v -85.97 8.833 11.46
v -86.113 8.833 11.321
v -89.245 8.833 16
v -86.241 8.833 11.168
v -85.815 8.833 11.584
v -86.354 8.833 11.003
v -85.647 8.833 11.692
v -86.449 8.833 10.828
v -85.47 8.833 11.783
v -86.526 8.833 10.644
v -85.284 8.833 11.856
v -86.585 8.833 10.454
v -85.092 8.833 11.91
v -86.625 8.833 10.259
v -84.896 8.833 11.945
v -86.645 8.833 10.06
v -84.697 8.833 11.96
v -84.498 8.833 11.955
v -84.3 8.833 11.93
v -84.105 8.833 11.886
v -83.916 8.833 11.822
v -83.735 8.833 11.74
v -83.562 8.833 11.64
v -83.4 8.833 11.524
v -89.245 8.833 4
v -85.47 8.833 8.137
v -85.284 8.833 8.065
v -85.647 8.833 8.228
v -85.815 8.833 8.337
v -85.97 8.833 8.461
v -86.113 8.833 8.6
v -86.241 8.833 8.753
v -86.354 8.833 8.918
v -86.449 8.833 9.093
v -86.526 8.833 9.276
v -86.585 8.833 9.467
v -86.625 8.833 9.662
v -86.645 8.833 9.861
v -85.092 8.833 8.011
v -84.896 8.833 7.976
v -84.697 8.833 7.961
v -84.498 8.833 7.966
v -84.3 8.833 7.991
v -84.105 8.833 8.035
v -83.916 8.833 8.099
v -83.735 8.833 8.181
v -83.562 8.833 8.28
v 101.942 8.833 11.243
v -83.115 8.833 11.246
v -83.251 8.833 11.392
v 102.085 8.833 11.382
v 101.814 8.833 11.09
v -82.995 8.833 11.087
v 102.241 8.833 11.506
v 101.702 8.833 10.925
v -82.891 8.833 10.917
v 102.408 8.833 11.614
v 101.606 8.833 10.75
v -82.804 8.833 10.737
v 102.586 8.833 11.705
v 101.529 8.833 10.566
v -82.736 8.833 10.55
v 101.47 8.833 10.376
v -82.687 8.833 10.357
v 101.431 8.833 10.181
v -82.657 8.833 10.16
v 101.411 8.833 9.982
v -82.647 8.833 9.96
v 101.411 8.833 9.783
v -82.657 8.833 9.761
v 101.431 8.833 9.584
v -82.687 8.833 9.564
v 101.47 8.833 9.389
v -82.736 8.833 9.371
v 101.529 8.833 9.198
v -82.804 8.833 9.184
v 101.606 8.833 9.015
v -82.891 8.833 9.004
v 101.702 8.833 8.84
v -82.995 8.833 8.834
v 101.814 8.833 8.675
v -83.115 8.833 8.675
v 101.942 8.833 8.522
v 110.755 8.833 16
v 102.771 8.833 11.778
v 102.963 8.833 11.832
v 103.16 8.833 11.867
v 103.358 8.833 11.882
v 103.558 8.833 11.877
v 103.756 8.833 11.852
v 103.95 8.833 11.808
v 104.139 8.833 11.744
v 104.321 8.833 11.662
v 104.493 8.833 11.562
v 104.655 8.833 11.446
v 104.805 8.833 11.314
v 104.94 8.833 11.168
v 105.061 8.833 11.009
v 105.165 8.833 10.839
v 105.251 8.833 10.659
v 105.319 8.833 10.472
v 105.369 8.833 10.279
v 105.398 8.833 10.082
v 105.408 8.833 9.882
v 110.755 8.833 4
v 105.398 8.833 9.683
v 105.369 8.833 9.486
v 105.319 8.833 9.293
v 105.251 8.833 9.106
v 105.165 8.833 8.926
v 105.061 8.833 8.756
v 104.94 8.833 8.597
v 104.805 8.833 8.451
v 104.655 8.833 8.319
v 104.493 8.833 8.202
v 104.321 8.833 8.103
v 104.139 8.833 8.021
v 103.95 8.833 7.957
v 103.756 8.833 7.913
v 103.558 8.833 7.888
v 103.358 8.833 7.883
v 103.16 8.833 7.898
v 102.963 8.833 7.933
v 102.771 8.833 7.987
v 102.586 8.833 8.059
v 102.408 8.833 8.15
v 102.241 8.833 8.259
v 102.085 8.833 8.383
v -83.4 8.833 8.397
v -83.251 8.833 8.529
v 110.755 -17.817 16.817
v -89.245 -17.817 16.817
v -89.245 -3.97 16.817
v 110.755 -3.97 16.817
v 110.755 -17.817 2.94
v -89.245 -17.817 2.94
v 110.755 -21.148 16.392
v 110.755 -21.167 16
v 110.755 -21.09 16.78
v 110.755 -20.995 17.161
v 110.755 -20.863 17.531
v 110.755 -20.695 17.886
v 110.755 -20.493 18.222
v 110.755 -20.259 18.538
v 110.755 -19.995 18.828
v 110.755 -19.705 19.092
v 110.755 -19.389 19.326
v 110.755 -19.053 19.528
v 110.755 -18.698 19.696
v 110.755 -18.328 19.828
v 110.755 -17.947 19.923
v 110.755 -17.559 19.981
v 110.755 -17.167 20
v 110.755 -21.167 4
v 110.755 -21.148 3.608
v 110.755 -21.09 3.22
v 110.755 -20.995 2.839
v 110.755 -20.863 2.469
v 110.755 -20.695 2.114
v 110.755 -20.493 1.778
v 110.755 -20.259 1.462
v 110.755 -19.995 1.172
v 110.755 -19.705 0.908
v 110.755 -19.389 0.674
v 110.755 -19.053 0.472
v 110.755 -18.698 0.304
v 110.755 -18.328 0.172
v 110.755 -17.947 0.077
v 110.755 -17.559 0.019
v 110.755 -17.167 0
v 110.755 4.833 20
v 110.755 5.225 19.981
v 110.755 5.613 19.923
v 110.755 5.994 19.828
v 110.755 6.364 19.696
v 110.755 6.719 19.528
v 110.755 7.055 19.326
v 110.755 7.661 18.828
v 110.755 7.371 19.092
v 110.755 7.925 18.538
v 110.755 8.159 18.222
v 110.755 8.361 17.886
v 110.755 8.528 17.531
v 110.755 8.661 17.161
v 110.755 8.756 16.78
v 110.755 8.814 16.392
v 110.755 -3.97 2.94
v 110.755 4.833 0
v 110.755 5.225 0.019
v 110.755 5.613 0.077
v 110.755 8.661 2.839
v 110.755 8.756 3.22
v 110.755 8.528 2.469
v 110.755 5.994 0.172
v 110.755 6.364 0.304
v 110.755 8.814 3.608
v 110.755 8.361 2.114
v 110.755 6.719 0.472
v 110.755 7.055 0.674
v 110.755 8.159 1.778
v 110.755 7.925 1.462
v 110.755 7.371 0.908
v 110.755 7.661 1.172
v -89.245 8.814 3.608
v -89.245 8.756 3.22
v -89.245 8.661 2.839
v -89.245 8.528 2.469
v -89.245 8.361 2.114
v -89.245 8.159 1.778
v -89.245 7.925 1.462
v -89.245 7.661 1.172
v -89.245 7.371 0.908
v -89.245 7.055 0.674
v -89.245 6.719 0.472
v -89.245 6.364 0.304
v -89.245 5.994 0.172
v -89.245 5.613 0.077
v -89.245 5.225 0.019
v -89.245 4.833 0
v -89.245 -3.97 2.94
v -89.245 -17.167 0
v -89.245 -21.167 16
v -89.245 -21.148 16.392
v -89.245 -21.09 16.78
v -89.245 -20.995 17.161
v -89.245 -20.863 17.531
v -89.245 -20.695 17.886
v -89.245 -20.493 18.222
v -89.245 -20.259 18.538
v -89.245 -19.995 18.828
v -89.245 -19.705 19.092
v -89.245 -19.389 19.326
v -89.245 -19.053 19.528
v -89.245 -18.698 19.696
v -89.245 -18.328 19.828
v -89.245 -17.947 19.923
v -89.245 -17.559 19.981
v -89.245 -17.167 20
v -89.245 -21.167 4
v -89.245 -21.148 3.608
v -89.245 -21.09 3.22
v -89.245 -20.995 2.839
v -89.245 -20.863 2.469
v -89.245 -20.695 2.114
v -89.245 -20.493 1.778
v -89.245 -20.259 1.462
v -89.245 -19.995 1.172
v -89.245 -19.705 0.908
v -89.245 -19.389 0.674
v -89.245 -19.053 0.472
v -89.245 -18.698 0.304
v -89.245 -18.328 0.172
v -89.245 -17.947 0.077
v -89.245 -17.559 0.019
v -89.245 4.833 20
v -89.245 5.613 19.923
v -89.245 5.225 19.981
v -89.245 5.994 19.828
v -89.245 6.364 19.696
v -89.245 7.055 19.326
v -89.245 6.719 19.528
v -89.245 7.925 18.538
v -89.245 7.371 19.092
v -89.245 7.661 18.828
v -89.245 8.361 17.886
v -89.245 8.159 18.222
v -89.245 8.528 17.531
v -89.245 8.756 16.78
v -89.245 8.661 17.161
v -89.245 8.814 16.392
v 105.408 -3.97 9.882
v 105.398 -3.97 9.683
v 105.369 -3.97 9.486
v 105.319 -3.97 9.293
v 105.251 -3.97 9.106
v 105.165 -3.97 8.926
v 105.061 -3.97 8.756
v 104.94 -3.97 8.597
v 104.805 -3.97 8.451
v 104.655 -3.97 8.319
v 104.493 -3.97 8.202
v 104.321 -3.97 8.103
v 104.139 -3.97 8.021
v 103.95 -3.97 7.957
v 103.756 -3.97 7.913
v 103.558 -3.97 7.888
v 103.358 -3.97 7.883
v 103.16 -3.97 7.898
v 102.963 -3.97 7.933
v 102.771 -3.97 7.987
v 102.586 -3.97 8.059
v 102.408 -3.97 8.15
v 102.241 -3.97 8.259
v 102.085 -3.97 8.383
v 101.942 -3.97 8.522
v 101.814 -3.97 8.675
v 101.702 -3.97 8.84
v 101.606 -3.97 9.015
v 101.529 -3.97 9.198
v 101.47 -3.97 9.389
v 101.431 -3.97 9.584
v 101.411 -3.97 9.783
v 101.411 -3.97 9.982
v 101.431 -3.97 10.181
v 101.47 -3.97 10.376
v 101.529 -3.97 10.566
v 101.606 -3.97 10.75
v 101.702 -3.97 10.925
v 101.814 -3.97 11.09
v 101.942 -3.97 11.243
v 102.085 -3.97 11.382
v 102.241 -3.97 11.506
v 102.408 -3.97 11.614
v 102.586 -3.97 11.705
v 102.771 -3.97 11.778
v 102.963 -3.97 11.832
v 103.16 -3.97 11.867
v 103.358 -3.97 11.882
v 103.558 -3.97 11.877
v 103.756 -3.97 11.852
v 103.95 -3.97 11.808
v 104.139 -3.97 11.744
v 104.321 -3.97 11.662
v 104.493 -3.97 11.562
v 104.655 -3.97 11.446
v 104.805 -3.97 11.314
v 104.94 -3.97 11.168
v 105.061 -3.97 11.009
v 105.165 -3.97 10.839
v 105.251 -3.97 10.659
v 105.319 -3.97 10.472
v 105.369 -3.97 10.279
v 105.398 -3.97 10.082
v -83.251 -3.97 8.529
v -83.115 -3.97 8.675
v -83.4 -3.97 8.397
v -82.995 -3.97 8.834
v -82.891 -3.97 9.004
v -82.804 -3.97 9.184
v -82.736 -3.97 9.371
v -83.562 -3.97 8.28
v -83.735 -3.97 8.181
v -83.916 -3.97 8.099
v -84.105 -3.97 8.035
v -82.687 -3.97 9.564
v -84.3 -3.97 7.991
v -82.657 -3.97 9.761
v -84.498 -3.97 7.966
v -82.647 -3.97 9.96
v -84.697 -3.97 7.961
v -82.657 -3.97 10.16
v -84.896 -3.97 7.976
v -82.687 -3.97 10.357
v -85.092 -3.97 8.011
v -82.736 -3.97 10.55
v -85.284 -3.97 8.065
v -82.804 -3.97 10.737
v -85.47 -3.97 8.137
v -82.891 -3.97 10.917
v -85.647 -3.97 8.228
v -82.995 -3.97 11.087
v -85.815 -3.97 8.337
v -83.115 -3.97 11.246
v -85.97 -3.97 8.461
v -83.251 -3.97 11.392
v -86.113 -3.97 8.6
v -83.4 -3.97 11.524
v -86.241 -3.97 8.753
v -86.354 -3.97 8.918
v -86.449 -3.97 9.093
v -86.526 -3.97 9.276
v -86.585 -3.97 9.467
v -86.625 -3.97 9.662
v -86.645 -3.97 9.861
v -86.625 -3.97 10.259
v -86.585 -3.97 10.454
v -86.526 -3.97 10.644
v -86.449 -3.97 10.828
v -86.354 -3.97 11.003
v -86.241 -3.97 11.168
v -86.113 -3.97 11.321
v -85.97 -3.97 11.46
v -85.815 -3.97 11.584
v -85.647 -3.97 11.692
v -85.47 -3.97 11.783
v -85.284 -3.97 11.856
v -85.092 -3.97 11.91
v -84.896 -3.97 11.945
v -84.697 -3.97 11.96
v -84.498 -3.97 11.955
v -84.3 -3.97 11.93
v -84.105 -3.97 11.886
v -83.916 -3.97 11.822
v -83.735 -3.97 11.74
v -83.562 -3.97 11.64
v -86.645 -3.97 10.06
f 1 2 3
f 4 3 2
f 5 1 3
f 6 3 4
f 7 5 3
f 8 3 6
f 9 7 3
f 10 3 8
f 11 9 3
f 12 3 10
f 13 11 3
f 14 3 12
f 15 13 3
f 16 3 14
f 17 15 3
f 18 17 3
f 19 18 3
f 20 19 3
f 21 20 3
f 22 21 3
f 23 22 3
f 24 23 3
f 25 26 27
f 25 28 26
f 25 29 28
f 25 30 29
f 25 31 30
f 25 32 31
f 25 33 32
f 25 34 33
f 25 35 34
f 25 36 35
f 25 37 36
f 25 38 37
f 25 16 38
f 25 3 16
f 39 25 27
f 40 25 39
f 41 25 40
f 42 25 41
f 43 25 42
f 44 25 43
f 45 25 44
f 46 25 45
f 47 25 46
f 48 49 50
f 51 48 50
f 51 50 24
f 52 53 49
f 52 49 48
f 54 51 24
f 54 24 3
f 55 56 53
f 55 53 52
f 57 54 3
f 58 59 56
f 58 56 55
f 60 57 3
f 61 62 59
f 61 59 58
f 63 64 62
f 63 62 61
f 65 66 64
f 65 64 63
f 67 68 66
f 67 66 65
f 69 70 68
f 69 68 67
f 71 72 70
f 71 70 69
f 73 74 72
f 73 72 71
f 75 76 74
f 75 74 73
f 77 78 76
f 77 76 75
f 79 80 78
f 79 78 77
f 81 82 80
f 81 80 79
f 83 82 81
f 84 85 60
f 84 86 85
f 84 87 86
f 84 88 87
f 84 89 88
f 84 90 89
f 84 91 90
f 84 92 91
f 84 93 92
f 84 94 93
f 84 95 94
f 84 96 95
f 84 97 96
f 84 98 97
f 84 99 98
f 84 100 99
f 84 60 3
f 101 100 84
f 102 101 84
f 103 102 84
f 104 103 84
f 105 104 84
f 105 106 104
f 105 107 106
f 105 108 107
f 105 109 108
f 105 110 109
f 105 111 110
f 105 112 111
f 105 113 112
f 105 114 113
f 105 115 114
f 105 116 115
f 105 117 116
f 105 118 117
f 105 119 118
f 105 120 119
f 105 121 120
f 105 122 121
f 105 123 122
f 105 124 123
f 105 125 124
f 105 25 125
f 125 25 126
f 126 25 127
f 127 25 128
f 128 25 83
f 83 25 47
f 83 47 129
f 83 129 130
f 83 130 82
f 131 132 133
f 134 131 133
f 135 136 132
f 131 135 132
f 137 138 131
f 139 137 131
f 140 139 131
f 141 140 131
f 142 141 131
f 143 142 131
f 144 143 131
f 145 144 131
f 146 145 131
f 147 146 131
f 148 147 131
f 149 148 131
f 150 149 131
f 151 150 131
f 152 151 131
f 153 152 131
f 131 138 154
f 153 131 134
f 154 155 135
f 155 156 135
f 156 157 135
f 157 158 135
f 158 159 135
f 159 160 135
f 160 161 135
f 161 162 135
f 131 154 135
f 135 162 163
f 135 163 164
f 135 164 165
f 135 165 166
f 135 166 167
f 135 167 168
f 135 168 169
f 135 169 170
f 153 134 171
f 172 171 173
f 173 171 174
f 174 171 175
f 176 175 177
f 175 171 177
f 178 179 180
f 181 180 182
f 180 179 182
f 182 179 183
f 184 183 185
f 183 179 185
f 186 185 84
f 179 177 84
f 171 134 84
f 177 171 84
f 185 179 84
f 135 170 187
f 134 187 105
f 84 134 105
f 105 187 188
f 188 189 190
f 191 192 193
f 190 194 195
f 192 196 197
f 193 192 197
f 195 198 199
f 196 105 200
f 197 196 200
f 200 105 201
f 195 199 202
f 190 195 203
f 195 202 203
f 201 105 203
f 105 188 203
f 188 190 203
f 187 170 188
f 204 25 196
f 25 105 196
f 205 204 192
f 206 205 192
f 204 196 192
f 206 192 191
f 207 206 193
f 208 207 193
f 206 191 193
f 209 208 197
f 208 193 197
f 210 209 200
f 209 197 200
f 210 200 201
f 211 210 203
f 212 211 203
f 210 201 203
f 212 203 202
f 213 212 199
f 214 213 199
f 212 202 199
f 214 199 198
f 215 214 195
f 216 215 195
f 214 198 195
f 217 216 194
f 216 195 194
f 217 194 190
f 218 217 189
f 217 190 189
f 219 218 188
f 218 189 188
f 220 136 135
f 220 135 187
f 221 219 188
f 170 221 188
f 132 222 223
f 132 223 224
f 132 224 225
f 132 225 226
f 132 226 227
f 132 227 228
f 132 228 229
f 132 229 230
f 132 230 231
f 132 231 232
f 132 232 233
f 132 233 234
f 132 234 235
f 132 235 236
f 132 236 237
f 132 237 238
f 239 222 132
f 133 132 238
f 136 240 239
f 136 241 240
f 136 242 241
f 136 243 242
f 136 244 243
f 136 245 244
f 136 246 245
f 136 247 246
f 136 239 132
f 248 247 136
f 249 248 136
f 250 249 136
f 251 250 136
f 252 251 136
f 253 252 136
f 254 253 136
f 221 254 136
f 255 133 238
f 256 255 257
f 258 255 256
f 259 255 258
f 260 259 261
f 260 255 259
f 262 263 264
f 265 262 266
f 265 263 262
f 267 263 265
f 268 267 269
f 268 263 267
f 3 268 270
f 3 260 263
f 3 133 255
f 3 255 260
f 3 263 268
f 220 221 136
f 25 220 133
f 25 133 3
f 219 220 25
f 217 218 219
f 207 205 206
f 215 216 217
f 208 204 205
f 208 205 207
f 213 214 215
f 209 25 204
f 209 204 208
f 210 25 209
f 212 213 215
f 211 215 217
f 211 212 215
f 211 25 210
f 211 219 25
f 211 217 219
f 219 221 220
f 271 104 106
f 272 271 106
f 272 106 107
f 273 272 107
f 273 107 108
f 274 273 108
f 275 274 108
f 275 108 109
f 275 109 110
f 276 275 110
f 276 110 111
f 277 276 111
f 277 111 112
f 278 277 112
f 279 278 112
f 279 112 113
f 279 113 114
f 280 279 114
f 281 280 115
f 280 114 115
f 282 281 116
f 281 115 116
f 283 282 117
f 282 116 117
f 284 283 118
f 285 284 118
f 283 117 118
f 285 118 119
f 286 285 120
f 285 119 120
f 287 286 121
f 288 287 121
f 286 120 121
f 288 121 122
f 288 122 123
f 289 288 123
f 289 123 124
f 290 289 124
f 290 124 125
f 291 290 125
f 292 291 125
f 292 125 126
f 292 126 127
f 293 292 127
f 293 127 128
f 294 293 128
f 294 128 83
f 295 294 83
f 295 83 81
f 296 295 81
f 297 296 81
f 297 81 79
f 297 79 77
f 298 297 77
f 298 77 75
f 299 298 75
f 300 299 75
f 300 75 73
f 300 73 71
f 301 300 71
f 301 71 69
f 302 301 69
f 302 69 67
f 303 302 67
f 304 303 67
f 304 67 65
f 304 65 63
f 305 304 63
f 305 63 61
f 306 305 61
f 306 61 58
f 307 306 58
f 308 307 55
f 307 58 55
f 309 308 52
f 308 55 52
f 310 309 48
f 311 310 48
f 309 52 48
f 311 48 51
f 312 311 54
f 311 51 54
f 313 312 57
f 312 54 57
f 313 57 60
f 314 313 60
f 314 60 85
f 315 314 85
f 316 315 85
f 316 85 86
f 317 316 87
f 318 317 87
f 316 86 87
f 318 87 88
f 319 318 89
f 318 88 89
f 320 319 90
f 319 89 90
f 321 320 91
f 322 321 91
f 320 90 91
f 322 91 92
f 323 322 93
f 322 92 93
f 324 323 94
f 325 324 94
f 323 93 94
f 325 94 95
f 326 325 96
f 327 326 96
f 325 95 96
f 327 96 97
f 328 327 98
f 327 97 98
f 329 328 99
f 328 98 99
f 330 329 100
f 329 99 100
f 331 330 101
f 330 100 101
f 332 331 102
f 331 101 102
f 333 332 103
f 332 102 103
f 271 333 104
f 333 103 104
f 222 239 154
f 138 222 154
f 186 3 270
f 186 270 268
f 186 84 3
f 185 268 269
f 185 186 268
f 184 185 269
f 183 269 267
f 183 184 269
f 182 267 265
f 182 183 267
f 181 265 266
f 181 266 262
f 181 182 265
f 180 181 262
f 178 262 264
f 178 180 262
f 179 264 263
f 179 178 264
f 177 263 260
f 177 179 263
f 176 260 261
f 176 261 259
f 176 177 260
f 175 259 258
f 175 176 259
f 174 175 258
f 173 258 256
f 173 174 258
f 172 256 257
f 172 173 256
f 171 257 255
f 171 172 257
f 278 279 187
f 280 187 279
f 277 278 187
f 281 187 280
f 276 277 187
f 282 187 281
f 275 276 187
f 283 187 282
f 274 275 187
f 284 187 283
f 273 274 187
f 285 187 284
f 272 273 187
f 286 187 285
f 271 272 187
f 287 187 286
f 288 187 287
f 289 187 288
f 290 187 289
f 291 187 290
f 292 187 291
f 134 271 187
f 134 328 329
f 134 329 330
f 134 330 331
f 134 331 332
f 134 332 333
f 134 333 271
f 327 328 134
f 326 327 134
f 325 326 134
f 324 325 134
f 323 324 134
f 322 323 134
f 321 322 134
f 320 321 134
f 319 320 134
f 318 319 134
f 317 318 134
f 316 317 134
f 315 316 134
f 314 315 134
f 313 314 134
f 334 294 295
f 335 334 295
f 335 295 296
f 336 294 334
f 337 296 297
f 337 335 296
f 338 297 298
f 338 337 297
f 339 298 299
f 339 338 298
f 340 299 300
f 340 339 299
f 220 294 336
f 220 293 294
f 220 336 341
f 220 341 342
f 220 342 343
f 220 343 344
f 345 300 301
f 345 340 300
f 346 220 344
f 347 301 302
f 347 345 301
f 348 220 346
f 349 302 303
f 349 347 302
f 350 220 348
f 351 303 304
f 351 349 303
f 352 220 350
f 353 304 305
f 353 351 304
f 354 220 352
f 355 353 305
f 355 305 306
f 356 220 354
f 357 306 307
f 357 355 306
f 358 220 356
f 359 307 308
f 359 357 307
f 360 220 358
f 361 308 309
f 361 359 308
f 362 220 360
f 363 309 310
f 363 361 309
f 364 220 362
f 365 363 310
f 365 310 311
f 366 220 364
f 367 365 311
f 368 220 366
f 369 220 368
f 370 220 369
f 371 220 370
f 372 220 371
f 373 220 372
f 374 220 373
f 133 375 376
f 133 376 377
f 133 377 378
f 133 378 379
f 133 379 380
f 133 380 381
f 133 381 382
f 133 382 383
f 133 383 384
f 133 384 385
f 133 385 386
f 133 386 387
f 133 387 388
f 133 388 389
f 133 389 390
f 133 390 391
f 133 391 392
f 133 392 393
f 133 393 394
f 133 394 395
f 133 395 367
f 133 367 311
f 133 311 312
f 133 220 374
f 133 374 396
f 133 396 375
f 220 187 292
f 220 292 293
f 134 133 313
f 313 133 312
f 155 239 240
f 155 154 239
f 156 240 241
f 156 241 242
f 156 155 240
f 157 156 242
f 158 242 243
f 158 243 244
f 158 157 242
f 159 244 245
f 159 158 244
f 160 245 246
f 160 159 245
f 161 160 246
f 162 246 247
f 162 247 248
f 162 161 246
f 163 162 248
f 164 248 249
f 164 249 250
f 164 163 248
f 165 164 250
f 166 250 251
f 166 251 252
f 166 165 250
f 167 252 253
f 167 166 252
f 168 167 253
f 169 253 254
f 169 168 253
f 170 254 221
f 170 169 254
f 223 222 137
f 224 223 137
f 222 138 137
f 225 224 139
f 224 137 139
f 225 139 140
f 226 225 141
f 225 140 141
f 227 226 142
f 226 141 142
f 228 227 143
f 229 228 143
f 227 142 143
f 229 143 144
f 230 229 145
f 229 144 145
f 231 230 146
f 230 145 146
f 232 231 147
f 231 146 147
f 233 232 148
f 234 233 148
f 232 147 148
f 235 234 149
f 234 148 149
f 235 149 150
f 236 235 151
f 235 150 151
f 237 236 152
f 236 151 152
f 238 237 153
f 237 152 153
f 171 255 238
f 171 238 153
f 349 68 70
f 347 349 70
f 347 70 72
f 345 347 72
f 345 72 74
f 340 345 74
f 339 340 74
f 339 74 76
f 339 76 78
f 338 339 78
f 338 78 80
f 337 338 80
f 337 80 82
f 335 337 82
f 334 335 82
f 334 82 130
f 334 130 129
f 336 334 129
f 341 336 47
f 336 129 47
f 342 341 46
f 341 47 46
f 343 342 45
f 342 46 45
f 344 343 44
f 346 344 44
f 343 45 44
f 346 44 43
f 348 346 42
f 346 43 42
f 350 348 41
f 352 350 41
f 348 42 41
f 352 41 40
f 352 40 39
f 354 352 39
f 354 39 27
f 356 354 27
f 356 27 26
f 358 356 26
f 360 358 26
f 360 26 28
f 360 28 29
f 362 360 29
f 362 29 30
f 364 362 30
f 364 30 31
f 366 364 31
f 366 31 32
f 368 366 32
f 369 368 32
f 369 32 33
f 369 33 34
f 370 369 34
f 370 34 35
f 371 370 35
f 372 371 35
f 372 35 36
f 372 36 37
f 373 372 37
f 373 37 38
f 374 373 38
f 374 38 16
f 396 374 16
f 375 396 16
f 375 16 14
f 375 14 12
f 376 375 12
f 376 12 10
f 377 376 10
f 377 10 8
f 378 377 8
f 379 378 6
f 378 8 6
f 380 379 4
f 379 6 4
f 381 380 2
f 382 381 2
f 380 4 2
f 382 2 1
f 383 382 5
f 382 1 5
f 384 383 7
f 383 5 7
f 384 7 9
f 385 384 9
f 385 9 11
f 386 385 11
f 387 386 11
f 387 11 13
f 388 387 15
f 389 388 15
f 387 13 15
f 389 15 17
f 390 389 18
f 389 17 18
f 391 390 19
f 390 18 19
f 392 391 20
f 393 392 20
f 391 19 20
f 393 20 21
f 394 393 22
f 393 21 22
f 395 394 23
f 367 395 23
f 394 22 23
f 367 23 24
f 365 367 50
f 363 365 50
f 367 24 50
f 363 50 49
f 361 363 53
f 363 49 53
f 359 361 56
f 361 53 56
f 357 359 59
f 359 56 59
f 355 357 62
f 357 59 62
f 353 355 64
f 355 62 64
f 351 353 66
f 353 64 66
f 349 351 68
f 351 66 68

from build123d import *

# Parameters (mm, degrees)
SKETCH1_W           = 200
SKETCH1_H           = 30
BOSS_EXTRUDE1_DEPTH = 20
FILLET8_R           = 4
SKETCH3_W           = 13.877219135
SKETCH3_H           = 13.846786638
CUT_EXTRUDE1_DEPTH  = 200
SKETCH4_R           = 2
CUT_EXTRUDE2_DEPTH  = 20
SKETCH5_R           = 2
CUT_EXTRUDE3_DEPTH  = 20


with BuildPart() as part:
    # Sketch1 → Boss-Extrude1 (new body)
    with BuildSketch(Plane.XY):
        with Locations((10.755148741, -6.167048055)):
            Rectangle(SKETCH1_W, SKETCH1_H)
    extrude(amount=BOSS_EXTRUDE1_DEPTH)

    # Fillet8
    fillet8_edges = [part.edges().sort_by_distance(p)[0] for p in [
        (10.755148741, 8.832951945, 20),
        (10.755148741, 8.832951945, 0),
        (10.755148741, -21.167048055, 0),
        (10.755148741, -21.167048055, 20),
    ]]
    fillet(fillet8_edges, radius=FILLET8_R)

    # Sketch3 → Cut-Extrude1 (cut)
    with BuildSketch(Plane.ZY.offset(89.244851259)):
        with Locations((9.878270008, -10.893155572)):
            Rectangle(SKETCH3_W, SKETCH3_H)
    extrude(amount=-CUT_EXTRUDE1_DEPTH, mode=Mode.SUBTRACT)

    # Sketch4 → Cut-Extrude2 (cut)
    with BuildSketch(Plane(origin=(0, 8.832951945, 0), x_dir=(1, 0, 0), z_dir=(0, 1, 0))):
        with Locations((-84.647114684, -9.960432704)):
            Circle(SKETCH4_R)
    extrude(amount=-CUT_EXTRUDE2_DEPTH, mode=Mode.SUBTRACT)

    # Sketch5 → Cut-Extrude3 (cut)
    with BuildSketch(Plane(origin=(0, 8.832951945, 0), x_dir=(1, 0, 0), z_dir=(0, 1, 0))):
        with Locations((103.408272514, -9.882419894)):
            Circle(SKETCH5_R)
    extrude(amount=-CUT_EXTRUDE3_DEPTH, mode=Mode.SUBTRACT)


solid = part.part
